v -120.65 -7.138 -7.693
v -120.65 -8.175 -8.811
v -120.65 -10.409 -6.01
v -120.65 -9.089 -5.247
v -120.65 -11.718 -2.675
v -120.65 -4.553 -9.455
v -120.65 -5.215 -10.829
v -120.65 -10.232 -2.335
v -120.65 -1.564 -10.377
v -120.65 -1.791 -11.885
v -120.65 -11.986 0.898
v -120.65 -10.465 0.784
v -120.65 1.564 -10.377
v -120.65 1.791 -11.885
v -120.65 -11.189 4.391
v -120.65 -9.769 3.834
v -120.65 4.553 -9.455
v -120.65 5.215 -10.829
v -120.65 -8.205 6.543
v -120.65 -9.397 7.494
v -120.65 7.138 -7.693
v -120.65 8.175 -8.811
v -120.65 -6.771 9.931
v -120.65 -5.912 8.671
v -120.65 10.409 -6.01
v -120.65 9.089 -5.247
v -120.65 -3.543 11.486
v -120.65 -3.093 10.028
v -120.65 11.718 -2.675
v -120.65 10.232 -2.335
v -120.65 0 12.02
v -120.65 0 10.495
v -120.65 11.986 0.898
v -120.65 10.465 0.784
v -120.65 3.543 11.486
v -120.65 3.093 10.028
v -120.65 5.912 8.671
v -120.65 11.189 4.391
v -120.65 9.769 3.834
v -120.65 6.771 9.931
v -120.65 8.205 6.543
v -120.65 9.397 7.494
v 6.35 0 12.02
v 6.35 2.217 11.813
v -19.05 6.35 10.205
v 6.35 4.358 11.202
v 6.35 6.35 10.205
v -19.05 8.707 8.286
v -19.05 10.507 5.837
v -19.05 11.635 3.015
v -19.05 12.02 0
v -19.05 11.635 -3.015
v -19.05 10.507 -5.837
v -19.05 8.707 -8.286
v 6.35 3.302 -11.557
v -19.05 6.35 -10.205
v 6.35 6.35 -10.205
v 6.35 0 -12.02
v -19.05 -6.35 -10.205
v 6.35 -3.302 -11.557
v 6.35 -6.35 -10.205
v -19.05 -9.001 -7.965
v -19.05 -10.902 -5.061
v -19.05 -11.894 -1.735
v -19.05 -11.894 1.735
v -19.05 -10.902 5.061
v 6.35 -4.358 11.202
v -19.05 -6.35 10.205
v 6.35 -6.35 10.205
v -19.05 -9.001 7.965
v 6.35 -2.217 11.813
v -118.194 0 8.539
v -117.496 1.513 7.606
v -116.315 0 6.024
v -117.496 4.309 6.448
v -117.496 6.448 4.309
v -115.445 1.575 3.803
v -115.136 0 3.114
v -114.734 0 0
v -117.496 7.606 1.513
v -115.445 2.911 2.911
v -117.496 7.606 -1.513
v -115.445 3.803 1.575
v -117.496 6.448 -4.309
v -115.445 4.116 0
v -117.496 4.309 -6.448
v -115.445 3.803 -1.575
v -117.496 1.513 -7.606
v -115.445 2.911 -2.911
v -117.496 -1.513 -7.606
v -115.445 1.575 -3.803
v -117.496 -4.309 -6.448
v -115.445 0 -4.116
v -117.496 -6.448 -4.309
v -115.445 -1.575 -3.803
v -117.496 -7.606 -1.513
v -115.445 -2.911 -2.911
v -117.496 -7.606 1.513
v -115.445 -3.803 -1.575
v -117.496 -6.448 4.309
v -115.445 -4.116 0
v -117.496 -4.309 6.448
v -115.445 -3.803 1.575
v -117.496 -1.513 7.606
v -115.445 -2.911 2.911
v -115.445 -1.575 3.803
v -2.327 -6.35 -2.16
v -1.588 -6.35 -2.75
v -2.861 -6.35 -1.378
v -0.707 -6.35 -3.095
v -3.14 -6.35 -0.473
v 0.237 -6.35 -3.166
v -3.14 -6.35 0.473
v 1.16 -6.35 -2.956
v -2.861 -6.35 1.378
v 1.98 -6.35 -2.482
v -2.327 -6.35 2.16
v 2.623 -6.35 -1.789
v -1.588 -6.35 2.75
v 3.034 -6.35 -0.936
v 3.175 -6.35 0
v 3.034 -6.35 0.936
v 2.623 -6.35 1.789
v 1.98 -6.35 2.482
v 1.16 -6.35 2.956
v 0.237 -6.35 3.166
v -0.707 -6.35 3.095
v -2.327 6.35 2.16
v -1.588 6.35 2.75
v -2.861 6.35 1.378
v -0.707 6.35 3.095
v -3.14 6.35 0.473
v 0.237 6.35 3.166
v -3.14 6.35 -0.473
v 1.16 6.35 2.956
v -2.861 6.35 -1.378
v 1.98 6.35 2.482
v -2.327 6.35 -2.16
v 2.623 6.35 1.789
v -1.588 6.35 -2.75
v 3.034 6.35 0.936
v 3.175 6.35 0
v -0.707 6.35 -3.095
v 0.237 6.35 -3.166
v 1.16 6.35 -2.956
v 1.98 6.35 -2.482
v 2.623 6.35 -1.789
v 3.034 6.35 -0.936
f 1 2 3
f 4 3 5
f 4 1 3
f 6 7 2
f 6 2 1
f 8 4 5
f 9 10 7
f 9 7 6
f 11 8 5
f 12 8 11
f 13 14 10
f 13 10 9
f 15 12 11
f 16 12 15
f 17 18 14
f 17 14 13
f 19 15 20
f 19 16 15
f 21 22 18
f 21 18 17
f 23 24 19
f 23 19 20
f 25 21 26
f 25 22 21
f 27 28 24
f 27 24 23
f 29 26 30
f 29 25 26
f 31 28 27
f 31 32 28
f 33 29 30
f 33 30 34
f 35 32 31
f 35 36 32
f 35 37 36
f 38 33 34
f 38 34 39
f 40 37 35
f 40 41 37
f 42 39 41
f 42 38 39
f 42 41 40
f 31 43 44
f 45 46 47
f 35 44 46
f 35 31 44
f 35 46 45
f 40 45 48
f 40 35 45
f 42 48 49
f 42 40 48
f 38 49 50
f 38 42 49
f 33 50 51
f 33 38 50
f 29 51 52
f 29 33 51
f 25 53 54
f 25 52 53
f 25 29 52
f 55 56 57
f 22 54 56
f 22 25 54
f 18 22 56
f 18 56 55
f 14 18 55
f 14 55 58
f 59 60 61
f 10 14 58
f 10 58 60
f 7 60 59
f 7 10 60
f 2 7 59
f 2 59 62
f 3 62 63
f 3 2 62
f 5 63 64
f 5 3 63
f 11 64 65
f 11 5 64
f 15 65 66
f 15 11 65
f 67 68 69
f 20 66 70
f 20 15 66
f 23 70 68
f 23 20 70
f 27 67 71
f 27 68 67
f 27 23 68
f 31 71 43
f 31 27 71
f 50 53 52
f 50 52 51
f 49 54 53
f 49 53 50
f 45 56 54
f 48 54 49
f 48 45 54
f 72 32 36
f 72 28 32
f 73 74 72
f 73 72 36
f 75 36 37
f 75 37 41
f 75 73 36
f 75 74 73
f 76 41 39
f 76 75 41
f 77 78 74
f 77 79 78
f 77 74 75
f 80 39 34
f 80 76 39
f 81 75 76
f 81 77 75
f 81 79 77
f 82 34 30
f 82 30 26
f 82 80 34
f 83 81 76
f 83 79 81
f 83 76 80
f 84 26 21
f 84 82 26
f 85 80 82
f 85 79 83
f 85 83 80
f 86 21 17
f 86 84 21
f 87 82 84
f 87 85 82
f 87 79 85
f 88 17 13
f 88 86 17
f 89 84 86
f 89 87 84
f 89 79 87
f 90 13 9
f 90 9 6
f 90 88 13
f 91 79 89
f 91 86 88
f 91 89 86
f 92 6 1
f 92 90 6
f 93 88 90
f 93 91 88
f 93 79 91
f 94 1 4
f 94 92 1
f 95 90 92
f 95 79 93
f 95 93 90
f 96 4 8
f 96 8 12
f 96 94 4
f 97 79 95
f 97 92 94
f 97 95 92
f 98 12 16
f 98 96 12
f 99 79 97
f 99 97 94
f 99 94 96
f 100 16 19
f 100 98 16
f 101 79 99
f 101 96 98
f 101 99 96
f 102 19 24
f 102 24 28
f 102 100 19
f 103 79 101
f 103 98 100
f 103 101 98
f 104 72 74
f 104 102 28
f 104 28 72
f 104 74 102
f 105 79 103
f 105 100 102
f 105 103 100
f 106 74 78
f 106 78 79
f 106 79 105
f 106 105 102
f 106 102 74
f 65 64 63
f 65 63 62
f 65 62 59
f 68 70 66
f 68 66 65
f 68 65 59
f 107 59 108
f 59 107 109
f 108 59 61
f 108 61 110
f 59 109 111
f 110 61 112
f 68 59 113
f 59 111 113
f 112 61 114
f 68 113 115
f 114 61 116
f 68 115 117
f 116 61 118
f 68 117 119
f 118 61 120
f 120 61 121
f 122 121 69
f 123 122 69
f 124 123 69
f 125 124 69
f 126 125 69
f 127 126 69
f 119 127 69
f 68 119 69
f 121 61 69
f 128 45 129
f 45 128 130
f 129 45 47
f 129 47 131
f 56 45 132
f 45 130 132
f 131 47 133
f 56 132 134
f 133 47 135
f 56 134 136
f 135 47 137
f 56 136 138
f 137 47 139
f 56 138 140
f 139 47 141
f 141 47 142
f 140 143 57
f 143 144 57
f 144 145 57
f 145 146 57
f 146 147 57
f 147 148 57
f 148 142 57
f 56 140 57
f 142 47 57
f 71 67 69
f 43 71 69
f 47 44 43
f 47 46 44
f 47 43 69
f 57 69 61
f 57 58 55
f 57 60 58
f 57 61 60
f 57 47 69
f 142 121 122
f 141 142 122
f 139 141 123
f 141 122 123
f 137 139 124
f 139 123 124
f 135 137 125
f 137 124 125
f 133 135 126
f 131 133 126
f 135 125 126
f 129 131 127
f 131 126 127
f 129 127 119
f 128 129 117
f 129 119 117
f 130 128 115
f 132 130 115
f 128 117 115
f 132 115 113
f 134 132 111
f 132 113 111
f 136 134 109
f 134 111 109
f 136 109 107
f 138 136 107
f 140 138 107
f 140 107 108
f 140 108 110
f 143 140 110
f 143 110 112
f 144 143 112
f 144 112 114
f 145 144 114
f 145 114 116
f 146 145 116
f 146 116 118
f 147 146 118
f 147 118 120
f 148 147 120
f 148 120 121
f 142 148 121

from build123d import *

# Parameters (mm, degrees)
F3_DEPTH = 25.4
F4_R     = 3.175
F5_DEPTH = 18.3706396773


with BuildPart() as f1:
    # F0 (on Front) → F1 (revolve)
    with BuildSketch(Plane.XZ):
        with BuildLine():
            Line((6.35, 12.0196396773), (-120.65, 12.0196396773))
            Line((-120.65, 12.0196396773), (-120.65, 10.49467489))
            ThreePointArc((-120.65, 10.49467489), (-116.3146984161, 6.0237057619), (-114.733757664, 0))
            Line((-114.733757664, 0), (6.35, 0))
            Line((6.35, 0), (6.35, 12.0196396773))
        make_face()
    revolve(axis=Axis((-54.191878832, 0, 0), (-1, 0, 0)))

    # F2 (on face) → F3 (cut)
    with BuildSketch(Plane.YZ.offset(6.35)):
        with BuildLine():
            Line((-6.35, -10.2053533977), (-6.35, 10.2053533977))
            ThreePointArc((-6.35, 10.2053533977), (-12.0196396773, 0), (-6.35, -10.2053533977))
        make_face()
        with BuildLine():
            ThreePointArc((12.0196396773, 0), (10.5070559607, 5.8372521798), (6.35, 10.2053533977))
            Line((6.35, 10.2053533977), (6.35, -10.2053533977))
            ThreePointArc((6.35, -10.2053533977), (10.5070559607, -5.8372521798), (12.0196396773, 0))
        make_face()
    extrude(amount=-F3_DEPTH, mode=Mode.SUBTRACT)

    # F4 (on face) → F5 (cut, through all)
    with BuildSketch(Plane.XZ.offset(6.35)):
        Circle(F4_R)
    extrude(amount=-F5_DEPTH, mode=Mode.SUBTRACT)


solid = f1.part
